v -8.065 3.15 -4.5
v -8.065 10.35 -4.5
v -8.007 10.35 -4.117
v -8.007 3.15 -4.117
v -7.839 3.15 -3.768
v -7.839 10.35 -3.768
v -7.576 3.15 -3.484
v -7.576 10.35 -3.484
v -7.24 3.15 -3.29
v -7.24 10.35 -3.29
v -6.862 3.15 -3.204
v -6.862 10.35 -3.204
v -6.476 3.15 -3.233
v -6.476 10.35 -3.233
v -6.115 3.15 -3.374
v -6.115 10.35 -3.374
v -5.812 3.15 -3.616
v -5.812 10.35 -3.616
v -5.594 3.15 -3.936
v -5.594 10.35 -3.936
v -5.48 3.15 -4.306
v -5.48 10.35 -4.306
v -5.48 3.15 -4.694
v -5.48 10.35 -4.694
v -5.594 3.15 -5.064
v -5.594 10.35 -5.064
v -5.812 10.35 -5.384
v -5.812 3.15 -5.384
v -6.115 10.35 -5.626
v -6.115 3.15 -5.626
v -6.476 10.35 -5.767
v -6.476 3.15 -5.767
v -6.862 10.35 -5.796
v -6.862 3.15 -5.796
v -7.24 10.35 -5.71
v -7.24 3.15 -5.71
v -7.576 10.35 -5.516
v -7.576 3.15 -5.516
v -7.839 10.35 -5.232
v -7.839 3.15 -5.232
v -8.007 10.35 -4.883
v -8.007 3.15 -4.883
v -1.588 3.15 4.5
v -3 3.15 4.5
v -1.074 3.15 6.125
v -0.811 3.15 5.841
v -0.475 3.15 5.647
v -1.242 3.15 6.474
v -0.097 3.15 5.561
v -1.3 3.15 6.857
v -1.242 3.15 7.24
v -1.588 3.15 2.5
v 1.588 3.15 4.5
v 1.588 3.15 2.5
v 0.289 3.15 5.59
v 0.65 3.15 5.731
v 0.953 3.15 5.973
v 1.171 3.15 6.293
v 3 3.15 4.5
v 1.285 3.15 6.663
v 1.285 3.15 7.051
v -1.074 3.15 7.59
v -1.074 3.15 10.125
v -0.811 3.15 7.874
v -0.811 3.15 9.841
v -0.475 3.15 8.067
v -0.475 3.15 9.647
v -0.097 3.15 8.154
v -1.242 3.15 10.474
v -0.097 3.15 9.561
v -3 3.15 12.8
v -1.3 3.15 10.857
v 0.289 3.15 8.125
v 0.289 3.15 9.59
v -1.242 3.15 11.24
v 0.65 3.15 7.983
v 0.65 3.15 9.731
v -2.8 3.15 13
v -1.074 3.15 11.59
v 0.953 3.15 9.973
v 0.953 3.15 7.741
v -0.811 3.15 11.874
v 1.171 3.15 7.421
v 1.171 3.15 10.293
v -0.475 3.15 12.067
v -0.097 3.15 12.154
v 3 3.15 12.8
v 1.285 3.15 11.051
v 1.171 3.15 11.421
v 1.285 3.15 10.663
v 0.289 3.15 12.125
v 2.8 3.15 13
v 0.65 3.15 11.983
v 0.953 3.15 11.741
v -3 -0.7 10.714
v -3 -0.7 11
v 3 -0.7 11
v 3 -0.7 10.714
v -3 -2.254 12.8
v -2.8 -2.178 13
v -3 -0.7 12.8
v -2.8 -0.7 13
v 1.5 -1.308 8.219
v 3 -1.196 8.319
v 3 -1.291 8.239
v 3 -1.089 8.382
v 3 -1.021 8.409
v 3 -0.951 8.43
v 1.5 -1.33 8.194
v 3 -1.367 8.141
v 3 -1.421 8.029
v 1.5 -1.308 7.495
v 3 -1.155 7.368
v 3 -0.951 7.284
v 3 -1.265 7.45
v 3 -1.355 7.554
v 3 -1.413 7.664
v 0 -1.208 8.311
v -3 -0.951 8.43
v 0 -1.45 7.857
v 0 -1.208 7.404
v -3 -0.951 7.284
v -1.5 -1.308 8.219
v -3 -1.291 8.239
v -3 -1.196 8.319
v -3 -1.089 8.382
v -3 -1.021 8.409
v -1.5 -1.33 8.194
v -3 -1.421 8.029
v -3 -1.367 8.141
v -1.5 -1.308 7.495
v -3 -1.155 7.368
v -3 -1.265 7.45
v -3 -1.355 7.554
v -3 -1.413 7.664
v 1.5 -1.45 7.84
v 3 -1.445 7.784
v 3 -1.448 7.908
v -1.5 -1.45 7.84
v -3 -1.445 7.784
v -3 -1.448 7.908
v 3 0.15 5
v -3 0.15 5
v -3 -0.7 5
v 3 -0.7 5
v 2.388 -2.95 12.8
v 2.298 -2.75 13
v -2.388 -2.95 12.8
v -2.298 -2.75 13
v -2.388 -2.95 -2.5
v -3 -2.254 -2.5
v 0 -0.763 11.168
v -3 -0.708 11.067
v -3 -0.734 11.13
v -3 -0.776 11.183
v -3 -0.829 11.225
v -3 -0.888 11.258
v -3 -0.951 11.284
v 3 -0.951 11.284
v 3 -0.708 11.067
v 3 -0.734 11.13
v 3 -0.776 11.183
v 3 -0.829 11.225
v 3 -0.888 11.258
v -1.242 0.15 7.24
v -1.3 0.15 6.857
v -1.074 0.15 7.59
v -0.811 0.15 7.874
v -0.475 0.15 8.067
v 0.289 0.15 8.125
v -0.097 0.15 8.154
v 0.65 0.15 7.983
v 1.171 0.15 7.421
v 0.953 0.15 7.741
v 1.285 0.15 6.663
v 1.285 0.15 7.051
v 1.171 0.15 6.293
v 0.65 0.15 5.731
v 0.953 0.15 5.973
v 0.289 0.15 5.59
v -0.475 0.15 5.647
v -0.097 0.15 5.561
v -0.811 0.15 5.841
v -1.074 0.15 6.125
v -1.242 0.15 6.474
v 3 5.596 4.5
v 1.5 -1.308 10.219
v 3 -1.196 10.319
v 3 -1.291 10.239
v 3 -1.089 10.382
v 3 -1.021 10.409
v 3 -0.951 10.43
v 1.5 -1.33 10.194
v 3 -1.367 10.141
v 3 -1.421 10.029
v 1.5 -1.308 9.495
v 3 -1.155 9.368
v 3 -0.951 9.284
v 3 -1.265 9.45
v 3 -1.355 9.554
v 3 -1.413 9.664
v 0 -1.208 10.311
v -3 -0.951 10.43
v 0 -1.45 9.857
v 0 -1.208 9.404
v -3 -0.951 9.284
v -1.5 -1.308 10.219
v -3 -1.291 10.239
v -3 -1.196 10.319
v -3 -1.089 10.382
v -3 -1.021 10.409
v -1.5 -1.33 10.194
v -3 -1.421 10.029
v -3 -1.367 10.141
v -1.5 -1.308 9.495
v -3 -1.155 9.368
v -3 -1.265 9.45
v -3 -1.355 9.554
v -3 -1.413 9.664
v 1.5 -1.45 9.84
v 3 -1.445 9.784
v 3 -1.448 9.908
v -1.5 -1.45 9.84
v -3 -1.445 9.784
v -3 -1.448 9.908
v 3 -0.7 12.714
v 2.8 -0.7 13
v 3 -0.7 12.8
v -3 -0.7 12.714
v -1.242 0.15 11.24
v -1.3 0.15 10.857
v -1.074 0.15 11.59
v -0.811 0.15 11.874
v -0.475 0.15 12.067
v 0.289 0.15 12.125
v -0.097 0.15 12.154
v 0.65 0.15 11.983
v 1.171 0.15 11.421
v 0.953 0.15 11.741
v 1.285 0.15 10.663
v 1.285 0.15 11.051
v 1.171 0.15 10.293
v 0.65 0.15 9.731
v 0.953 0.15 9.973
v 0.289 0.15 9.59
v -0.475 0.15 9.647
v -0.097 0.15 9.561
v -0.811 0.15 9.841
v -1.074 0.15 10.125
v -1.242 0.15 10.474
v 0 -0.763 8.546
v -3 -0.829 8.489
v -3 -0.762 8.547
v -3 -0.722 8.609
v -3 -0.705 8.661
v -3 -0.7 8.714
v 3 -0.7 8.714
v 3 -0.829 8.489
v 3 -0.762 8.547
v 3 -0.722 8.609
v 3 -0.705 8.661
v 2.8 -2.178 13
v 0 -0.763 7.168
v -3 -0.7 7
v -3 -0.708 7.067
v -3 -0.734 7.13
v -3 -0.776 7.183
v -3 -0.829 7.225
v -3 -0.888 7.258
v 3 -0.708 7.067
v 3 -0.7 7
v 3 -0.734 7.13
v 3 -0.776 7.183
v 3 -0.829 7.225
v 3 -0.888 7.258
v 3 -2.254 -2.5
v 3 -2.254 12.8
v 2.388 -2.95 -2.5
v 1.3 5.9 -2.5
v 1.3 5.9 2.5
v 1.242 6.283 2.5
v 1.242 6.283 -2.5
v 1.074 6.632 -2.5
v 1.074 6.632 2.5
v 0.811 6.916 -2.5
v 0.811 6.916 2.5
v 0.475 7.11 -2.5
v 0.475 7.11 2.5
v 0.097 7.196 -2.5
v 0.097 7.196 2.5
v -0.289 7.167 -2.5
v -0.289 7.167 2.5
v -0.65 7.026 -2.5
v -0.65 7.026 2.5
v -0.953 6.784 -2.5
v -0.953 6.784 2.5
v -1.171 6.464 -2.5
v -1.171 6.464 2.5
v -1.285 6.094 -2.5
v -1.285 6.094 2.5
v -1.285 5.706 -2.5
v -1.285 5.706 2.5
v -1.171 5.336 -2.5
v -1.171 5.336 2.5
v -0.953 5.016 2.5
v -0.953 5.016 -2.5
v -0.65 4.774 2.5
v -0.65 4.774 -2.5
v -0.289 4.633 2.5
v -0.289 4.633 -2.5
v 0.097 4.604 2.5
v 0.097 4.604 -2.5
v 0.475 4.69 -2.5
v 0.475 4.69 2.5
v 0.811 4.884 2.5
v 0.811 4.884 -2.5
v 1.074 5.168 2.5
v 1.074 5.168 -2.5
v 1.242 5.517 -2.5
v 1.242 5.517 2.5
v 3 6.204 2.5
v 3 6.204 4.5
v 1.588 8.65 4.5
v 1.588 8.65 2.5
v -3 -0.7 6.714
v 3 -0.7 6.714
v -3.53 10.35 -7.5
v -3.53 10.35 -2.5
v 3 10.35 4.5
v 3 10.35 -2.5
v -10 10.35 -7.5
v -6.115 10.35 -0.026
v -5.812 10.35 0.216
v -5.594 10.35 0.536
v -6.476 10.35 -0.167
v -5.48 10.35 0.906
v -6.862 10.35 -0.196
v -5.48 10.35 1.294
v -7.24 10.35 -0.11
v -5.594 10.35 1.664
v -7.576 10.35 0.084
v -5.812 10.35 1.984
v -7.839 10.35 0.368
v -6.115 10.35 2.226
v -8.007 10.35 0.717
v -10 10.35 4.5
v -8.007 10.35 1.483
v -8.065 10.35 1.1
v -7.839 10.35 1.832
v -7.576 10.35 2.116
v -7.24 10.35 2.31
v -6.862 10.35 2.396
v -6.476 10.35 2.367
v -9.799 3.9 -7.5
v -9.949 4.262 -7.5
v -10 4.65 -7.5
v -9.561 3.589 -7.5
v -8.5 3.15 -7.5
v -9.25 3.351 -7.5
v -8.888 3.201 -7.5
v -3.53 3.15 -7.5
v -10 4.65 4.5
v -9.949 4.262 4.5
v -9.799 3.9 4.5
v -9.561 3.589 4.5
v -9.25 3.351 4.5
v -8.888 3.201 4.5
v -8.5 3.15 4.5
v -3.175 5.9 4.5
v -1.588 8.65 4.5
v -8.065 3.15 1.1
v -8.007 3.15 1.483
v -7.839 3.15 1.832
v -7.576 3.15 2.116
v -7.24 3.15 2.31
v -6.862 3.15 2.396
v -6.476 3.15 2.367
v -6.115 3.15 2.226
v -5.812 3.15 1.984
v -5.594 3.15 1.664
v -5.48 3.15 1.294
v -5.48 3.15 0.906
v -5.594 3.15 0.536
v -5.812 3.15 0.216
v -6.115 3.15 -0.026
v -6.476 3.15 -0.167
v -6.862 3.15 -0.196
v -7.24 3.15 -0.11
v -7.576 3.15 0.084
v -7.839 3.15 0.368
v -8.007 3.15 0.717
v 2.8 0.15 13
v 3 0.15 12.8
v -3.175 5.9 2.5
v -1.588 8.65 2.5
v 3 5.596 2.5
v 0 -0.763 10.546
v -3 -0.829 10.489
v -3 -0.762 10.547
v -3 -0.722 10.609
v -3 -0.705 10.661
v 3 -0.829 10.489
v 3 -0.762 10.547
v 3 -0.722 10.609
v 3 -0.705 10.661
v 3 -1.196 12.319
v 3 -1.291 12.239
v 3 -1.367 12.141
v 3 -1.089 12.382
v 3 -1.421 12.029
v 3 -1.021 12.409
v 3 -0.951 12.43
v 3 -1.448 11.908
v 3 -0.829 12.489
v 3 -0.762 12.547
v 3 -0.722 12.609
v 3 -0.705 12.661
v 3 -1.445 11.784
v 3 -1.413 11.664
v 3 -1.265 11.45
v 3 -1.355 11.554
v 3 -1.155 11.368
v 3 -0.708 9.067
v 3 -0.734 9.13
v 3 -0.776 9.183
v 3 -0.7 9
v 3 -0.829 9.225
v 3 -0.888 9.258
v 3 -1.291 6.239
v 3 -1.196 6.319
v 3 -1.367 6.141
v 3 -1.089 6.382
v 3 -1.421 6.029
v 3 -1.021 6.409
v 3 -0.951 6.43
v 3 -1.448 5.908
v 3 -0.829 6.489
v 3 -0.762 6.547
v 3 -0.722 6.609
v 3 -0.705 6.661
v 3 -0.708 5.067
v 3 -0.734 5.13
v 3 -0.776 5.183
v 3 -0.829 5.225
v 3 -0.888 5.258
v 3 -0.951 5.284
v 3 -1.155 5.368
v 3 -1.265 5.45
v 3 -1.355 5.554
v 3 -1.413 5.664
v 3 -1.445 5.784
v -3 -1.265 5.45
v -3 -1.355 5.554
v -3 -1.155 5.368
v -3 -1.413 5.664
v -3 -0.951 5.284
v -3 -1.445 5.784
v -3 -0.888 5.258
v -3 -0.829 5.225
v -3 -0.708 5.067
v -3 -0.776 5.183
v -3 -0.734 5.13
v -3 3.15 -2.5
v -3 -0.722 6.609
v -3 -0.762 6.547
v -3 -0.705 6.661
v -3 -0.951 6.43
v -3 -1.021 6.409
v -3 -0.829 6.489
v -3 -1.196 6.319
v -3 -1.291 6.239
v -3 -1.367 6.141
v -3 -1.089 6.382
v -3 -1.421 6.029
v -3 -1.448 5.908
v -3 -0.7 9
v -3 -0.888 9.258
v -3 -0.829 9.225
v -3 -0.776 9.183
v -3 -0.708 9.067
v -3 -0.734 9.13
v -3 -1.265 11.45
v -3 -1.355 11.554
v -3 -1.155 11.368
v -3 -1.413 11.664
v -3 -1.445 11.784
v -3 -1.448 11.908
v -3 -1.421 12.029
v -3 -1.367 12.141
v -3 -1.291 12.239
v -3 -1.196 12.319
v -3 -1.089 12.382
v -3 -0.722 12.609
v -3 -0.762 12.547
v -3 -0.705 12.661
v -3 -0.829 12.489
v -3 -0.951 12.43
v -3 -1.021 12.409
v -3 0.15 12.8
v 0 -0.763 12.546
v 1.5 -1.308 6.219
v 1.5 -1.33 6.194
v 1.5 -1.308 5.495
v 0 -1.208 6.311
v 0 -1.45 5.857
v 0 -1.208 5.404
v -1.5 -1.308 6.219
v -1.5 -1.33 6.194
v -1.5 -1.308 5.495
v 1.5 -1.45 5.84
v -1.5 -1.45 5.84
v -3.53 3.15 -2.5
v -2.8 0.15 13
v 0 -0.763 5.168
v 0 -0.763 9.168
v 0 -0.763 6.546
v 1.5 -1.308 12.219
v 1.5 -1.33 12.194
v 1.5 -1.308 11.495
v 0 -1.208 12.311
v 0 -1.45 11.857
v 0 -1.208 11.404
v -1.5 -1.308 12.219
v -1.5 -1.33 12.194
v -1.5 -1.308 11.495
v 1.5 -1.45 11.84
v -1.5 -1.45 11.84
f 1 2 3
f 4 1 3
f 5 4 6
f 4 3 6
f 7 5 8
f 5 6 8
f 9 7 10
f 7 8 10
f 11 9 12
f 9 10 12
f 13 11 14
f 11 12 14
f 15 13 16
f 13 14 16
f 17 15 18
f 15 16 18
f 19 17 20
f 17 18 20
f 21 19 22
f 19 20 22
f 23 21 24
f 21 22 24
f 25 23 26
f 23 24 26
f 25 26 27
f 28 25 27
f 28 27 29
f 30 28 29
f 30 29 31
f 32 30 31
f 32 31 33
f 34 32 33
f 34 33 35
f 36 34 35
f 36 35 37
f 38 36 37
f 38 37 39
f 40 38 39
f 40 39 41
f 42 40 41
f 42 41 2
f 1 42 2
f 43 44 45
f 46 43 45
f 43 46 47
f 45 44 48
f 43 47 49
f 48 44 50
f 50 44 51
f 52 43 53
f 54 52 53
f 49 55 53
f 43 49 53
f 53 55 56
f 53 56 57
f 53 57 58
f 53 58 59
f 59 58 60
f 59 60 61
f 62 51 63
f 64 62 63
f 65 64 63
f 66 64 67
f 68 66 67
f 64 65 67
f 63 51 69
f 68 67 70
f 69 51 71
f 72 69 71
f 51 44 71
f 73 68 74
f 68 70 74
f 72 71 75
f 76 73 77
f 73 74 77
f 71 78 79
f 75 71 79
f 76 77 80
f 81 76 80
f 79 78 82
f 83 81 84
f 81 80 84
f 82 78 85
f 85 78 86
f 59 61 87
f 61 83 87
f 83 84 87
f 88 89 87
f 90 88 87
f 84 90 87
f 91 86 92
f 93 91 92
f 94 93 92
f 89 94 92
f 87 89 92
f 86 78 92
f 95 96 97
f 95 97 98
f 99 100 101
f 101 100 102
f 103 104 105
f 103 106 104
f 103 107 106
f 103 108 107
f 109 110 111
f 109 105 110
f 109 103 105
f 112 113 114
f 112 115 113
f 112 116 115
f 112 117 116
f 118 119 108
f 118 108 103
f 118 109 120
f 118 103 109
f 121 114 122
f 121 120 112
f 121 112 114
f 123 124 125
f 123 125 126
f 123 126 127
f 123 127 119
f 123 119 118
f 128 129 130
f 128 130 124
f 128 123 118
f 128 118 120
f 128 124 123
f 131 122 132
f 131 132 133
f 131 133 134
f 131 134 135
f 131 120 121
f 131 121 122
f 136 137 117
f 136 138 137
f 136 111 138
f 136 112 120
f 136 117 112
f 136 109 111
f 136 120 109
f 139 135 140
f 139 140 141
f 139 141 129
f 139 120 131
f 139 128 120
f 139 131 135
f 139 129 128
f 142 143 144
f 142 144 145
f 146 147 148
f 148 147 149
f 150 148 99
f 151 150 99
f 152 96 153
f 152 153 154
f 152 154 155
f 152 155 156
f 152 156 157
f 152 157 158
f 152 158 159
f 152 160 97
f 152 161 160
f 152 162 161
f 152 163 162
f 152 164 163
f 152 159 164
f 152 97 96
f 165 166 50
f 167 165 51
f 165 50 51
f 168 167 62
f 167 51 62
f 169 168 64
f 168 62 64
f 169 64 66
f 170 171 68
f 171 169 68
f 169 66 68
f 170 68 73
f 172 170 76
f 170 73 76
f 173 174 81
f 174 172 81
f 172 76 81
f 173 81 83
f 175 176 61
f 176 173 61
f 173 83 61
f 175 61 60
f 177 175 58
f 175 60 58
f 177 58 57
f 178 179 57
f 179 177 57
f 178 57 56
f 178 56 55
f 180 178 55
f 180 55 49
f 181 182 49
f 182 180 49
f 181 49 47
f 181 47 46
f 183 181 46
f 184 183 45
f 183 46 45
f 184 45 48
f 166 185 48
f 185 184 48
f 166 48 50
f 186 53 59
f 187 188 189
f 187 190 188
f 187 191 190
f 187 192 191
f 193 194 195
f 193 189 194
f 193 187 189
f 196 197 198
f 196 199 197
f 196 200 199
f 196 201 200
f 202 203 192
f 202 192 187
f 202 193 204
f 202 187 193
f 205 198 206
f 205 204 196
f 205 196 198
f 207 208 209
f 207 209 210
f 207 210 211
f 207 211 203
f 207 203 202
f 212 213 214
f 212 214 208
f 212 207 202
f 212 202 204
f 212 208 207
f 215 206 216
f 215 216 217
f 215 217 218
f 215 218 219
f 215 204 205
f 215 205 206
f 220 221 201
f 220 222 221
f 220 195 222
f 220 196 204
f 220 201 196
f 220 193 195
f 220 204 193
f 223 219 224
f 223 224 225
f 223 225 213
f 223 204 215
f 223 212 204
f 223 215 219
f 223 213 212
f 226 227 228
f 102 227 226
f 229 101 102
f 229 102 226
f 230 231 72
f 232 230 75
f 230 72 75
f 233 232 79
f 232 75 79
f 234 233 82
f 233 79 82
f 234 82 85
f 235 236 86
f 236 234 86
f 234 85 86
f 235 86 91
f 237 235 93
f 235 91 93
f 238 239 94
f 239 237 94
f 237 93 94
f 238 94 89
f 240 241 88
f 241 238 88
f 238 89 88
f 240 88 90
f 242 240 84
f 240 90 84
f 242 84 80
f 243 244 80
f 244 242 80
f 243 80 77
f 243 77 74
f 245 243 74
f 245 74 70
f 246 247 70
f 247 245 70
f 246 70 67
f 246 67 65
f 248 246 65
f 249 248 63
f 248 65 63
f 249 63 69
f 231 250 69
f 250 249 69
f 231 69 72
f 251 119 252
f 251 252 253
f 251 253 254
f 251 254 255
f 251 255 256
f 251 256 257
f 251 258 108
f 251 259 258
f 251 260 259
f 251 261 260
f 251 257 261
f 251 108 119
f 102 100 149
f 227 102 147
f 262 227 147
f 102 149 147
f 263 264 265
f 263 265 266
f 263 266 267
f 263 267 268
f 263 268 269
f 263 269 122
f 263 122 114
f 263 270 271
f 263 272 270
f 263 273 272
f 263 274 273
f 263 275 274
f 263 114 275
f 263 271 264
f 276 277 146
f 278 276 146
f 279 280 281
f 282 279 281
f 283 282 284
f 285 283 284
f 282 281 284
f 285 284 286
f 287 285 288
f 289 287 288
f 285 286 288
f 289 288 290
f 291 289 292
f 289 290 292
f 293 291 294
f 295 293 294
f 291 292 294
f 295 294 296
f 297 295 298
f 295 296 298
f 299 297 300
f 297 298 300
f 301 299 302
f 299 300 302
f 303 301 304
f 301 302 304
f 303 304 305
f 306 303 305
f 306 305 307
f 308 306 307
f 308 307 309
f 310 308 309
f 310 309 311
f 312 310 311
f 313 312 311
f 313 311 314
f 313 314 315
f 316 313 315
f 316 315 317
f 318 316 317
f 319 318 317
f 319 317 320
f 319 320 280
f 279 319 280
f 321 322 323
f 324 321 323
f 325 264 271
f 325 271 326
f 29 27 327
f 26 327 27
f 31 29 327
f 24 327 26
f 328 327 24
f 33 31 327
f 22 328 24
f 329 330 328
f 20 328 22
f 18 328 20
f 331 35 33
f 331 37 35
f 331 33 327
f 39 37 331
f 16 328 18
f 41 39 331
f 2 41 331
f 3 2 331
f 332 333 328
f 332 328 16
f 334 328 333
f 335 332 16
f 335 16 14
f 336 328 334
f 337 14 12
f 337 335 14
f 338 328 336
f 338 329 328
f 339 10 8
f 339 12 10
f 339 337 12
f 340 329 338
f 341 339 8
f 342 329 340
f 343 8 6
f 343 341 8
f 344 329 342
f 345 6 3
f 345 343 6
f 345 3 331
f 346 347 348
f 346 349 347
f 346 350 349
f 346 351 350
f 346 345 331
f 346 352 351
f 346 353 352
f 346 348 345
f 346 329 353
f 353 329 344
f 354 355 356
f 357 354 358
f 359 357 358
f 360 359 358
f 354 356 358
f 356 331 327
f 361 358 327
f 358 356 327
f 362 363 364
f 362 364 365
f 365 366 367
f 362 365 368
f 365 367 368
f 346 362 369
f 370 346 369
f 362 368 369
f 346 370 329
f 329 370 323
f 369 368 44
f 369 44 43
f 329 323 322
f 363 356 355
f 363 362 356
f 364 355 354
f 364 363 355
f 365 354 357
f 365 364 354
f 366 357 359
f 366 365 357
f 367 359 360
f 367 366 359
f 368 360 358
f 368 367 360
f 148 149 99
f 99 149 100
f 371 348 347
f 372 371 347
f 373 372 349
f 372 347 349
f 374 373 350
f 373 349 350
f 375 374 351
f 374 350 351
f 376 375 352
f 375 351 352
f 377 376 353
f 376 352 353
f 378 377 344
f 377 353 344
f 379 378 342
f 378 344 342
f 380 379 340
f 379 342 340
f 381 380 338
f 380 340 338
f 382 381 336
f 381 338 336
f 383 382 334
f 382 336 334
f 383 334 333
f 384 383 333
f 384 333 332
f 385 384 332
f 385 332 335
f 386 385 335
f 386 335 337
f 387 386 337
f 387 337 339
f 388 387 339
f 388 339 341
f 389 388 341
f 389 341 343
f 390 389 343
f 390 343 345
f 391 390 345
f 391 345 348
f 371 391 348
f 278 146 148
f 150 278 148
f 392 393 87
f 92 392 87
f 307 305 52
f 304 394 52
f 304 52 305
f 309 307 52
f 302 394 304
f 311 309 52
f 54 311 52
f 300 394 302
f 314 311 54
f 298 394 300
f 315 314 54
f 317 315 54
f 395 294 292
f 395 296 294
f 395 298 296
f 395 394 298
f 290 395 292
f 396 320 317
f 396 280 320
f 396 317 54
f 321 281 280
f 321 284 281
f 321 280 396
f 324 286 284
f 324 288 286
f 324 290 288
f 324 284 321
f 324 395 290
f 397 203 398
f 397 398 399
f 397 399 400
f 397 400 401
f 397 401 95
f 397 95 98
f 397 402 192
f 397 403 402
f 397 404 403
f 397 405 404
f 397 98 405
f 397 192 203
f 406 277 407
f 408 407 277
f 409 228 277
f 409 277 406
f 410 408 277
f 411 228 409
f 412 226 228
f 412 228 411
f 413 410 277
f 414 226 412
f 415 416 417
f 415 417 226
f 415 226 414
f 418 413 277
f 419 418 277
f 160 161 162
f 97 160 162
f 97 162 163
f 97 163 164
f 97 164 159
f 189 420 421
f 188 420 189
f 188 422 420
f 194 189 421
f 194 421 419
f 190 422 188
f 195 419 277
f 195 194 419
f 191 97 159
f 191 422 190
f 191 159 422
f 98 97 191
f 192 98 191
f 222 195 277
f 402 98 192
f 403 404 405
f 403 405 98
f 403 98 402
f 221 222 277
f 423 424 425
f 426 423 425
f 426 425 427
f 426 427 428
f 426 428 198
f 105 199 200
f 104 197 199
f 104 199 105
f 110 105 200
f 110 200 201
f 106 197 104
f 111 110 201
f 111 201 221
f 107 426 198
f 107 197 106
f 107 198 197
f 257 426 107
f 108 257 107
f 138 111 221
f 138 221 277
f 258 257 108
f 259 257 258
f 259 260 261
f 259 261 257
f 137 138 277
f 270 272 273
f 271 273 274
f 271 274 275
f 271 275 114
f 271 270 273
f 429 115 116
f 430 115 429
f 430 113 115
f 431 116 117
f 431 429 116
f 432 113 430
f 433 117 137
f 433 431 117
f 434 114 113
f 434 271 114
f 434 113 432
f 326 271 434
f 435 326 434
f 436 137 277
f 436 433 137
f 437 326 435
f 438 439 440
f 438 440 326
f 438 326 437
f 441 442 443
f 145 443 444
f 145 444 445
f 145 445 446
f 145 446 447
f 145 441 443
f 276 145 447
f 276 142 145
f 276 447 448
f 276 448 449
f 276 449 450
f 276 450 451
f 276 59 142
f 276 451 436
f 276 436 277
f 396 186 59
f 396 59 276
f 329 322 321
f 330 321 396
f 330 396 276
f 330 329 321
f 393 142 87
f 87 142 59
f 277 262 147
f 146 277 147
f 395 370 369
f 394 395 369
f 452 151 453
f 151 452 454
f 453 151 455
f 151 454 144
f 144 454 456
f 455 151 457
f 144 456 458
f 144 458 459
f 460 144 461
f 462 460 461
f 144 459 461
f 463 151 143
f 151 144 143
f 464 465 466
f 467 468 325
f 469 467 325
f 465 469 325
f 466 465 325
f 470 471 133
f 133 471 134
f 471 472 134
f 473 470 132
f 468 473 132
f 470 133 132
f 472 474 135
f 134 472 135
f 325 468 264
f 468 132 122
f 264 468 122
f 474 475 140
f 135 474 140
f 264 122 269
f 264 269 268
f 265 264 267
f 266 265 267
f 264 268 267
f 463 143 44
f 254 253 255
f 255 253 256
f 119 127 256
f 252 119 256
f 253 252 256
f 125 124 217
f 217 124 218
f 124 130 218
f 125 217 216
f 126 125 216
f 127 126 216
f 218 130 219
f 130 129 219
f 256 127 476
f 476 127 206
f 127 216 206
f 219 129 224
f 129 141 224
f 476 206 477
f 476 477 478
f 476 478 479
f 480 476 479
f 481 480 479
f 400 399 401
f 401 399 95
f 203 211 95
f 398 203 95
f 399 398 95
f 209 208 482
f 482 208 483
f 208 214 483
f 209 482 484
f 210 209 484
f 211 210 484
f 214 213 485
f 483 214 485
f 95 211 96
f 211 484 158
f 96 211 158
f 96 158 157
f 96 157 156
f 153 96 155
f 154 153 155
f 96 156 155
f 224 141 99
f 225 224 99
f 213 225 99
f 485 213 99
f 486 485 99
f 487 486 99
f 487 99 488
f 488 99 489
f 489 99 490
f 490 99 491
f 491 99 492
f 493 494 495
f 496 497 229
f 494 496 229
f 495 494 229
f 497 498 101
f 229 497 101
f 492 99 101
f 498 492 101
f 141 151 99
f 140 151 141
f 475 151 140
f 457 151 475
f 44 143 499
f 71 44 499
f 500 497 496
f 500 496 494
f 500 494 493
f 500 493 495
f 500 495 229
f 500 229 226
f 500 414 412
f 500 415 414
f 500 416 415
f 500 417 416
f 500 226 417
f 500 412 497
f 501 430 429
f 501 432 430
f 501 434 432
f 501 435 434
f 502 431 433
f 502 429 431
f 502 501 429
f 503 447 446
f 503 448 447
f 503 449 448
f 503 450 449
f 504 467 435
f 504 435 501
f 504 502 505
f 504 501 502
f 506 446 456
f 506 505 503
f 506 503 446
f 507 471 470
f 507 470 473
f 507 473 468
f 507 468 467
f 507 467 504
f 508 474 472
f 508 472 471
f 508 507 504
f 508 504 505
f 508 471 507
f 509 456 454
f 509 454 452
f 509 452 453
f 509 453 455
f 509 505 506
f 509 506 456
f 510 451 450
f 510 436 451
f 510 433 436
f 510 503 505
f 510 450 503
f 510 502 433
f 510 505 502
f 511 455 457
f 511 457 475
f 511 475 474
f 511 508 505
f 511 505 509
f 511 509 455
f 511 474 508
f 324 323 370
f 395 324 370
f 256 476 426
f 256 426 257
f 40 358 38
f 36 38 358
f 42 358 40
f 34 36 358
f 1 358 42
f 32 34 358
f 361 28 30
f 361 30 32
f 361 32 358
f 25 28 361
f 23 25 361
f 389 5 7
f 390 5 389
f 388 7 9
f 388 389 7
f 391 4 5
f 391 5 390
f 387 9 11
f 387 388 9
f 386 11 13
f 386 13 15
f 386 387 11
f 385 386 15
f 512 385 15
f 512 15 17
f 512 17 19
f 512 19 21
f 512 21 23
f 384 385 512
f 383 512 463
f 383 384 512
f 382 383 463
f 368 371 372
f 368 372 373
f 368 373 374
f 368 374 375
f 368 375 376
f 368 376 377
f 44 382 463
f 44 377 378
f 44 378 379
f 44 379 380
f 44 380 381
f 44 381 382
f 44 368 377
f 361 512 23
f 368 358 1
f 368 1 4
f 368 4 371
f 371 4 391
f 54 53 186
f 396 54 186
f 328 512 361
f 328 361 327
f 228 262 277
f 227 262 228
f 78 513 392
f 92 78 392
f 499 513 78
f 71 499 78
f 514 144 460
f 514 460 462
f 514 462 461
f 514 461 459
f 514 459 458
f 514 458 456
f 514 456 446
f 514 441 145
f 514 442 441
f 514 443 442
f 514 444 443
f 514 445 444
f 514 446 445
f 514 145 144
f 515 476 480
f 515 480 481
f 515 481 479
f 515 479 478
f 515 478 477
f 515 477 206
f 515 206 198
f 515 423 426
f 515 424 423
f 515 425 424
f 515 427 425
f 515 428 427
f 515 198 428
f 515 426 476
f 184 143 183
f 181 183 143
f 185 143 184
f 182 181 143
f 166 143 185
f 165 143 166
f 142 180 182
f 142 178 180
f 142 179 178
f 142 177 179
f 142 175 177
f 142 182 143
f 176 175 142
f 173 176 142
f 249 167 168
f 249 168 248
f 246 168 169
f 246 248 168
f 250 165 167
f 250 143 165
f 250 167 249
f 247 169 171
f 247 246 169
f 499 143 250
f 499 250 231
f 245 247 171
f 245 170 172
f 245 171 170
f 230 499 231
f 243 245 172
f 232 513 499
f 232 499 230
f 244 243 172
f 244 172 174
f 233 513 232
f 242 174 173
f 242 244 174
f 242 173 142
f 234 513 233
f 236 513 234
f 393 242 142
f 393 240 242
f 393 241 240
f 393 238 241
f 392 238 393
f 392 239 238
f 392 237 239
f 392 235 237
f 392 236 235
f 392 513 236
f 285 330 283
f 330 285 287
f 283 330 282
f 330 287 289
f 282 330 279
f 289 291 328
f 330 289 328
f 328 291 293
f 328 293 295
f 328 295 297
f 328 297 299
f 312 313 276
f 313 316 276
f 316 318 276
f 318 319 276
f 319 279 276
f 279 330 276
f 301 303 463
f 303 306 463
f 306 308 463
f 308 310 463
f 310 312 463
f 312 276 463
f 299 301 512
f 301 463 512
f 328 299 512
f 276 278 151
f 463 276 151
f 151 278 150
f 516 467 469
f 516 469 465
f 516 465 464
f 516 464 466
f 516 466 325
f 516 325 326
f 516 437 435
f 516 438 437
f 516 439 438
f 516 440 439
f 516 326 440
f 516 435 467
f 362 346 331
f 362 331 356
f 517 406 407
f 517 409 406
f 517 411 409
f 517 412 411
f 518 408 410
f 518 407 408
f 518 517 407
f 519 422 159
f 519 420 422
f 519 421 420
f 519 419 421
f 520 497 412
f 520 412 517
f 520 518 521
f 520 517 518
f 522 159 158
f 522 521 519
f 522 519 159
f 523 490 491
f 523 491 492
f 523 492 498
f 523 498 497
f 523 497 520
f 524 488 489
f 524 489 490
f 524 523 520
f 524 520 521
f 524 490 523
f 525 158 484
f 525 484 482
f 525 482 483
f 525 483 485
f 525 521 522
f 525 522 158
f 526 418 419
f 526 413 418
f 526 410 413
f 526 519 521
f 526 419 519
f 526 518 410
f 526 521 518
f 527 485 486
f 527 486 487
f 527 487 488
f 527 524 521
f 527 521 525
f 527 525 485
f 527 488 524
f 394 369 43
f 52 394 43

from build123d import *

# Parameters (mm, degrees)
BOSS_EXTRUDE1_DEPTH     = 13
SKETCH6_W               = 6
SKETCH6_H               = 5
BOSS_EXTRUDE4_DEPTH     = 5.6
SKETCH16_W              = 6
SKETCH16_H              = 8
BOSS_EXTRUDE5_DEPTH     = 0.1
CUT_EXTRUDE6_DEPTH      = 4
CUT_EXTRUDE6_DEPTH_BACK = 3.6
SKETCH15_R              = 1.3
CUT_EXTRUDE7_DEPTH      = 8.7202
CUT_EXTRUDE8_START      = -0.2202
SKETCH19_W              = 6
SKETCH19_H              = 8
SKETCH19_R              = 1.3
CUT_EXTRUDE8_DEPTH      = 0.2202
SKETCH12_R              = 1.2
CUT_EXTRUDE5_DEPTH      = 6
SKETCH21_R              = 1.2
BOSS_EXTRUDE6_DEPTH     = 2.5
SKETCH24_W              = 6
SKETCH24_H              = 5.5
CUT_EXTRUDE10_DEPTH     = 8.5
BOSS_EXTRUDE8_DEPTH     = 7.2
FILLET4_R               = 1.5
SKETCH26_R              = 1.3
CUT_EXTRUDE11_DEPTH     = 10
CHAMFER1_SIZE           = 0.2
BOSS_EXTRUDE9_DEPTH     = 5
SKETCH31_R              = 1.3
CUT_EXTRUDE12_DEPTH     = 8
CROQUIS1_W              = 20.968017067
CROQUIS1_H              = 19.092350392
CORTAR_EXTRUIR1_DEPTH   = 0.5
CORTAR_EXTRUIR2_DEPTH   = 2


with BuildPart() as part:
    # Sketch1 → Boss-Extrude1 (new body)
    with BuildSketch(Plane.XY):
        Polygon((3, 3.05), (3, -2.253801214), (2.388188946, -2.95), (-2.388188946, -2.95), (-3, -2.253801214), (-3, 3.05), align=None)
    extrude(amount=BOSS_EXTRUDE1_DEPTH)

    # Sketch6 → Boss-Extrude4 (add)
    with BuildSketch(Plane(origin=(0, 3.05, 0), x_dir=(1, 0, 0), z_dir=(0, 1, 0))):
        with Locations((0, -2.5)):
            Rectangle(SKETCH6_W, SKETCH6_H)
    extrude(amount=BOSS_EXTRUDE4_DEPTH)

    # Sketch16 → Boss-Extrude5 (add)
    with BuildSketch(Plane(origin=(0, 3.05, 0), x_dir=(1, 0, 0), z_dir=(0, 1, 0))):
        with Locations((0, -9)):
            Rectangle(SKETCH16_W, SKETCH16_H)
    extrude(amount=BOSS_EXTRUDE5_DEPTH)

    # Sketch18 → Cut-Extrude6 (cut, two sides: drawn at the far end of the back side and taken through both)
    with BuildSketch(Plane(origin=(0, 0, 0), x_dir=(0, 0, -1), z_dir=(1, 0, 0)).offset(-CUT_EXTRUDE6_DEPTH_BACK)):
        with BuildLine():
            Line((-8.8572, -0.0702), (-12.8572, -0.0702))
            Line((-12.8572, -0.0702), (-13, -0.0702))
            Line((-13, -0.0702), (-13, -0.7))
            Line((-13, -0.7), (-12.8572, -0.7))
            Line((-12.8572, -0.7), (-12.7144, -0.7))
            add(Edge.make_bspline(
                [(-12.7144, -0.7), (-12.5198, -0.7), (-12.43, -0.9509)],
                knots=[0.103448276, 0.103448276, 0.103448276, 0.137931034, 0.137931034, 0.137931034], degree=2))
            add(Edge.make_bspline(
                [(-12.43, -0.9509), (-12.3594, -1.2388), (-12.13, -1.45), (-11.8572, -1.45)],
                knots=[0.137931034, 0.137931034, 0.137931034, 0.137931034, 0.172413793, 0.172413793, 0.172413793, 0.172413793], degree=3))
            add(Edge.make_bspline(
                [(-11.8572, -1.45), (-11.5844, -1.45), (-11.355, -1.2388), (-11.2844, -0.9509)],
                knots=[0.172413793, 0.172413793, 0.172413793, 0.172413793, 0.206896552, 0.206896552, 0.206896552, 0.206896552], degree=3))
            add(Edge.make_bspline(
                [(-11.2844, -0.9509), (-11.1946, -0.7), (-11, -0.7)],
                knots=[0.206896552, 0.206896552, 0.206896552, 0.24137931, 0.24137931, 0.24137931], degree=2))
            Line((-11, -0.7), (-10.8572, -0.7))
            Line((-10.8572, -0.7), (-10.7144, -0.7))
            add(Edge.make_bspline(
                [(-10.7144, -0.7), (-10.5198, -0.7), (-10.43, -0.9509)],
                knots=[0.310344828, 0.310344828, 0.310344828, 0.344827586, 0.344827586, 0.344827586], degree=2))
            add(Edge.make_bspline(
                [(-10.43, -0.9509), (-10.3594, -1.2388), (-10.13, -1.45), (-9.8572, -1.45)],
                knots=[0.344827586, 0.344827586, 0.344827586, 0.344827586, 0.379310345, 0.379310345, 0.379310345, 0.379310345], degree=3))
            add(Edge.make_bspline(
                [(-9.8572, -1.45), (-9.5844, -1.45), (-9.355, -1.2388), (-9.2844, -0.9509)],
                knots=[0.379310345, 0.379310345, 0.379310345, 0.379310345, 0.413793103, 0.413793103, 0.413793103, 0.413793103], degree=3))
            add(Edge.make_bspline(
                [(-9.2844, -0.9509), (-9.1946, -0.7), (-9, -0.7)],
                knots=[0.413793103, 0.413793103, 0.413793103, 0.448275862, 0.448275862, 0.448275862], degree=2))
            Line((-9, -0.7), (-8.8572, -0.7))
            Line((-8.8572, -0.7), (-8.7144, -0.7))
            add(Edge.make_bspline(
                [(-8.7144, -0.7), (-8.5198, -0.7), (-8.43, -0.9509)],
                knots=[0.517241379, 0.517241379, 0.517241379, 0.551724138, 0.551724138, 0.551724138], degree=2))
            add(Edge.make_bspline(
                [(-8.43, -0.9509), (-8.3594, -1.2388), (-8.13, -1.45), (-7.8572, -1.45)],
                knots=[0.551724138, 0.551724138, 0.551724138, 0.551724138, 0.586206897, 0.586206897, 0.586206897, 0.586206897], degree=3))
            add(Edge.make_bspline(
                [(-7.8572, -1.45), (-7.5844, -1.45), (-7.355, -1.2388), (-7.2844, -0.9509)],
                knots=[0.586206897, 0.586206897, 0.586206897, 0.586206897, 0.620689655, 0.620689655, 0.620689655, 0.620689655], degree=3))
            add(Edge.make_bspline(
                [(-7.2844, -0.9509), (-7.1946, -0.7), (-7, -0.7)],
                knots=[0.620689655, 0.620689655, 0.620689655, 0.655172414, 0.655172414, 0.655172414], degree=2))
            Line((-7, -0.7), (-6.8572, -0.7))
            Line((-6.8572, -0.7), (-6.7144, -0.7))
            add(Edge.make_bspline(
                [(-6.7144, -0.7), (-6.5198, -0.7), (-6.43, -0.9509)],
                knots=[0.724137931, 0.724137931, 0.724137931, 0.75862069, 0.75862069, 0.75862069], degree=2))
            add(Edge.make_bspline(
                [(-6.43, -0.9509), (-6.3594, -1.2388), (-6.13, -1.45), (-5.8572, -1.45)],
                knots=[0.75862069, 0.75862069, 0.75862069, 0.75862069, 0.793103448, 0.793103448, 0.793103448, 0.793103448], degree=3))
            add(Edge.make_bspline(
                [(-5.8572, -1.45), (-5.5844, -1.45), (-5.355, -1.2388), (-5.2844, -0.9509)],
                knots=[0.793103448, 0.793103448, 0.793103448, 0.793103448, 0.827586207, 0.827586207, 0.827586207, 0.827586207], degree=3))
            add(Edge.make_bspline(
                [(-5.2844, -0.9509), (-5.1946, -0.7), (-5, -0.7)],
                knots=[0.827586207, 0.827586207, 0.827586207, 0.862068966, 0.862068966, 0.862068966], degree=2))
            Line((-5, -0.7), (-5, -0.0702))
            Line((-5, -0.0702), (-8.8572, -0.0702))
        make_face()
    extrude(amount=CUT_EXTRUDE6_DEPTH + CUT_EXTRUDE6_DEPTH_BACK, mode=Mode.SUBTRACT)

    # Sketch15 → Cut-Extrude7 (cut)
    with BuildSketch(Plane(origin=(0, 8.65, 0), x_dir=(1, 0, 0), z_dir=(0, 1, 0))):
        with Locations(Location((0, -10.8572, 0), (0, 0, 180))):
            Circle(SKETCH15_R)
        with Locations(Location((0, -6.8572, 0), (0, 0, 180))):
            Circle(SKETCH15_R)
    extrude(amount=-CUT_EXTRUDE7_DEPTH, mode=Mode.SUBTRACT)

    # Sketch19 → Cut-Extrude8 (cut)
    with BuildSketch(Plane.XZ.offset(0.0702).offset(CUT_EXTRUDE8_START)):
        with Locations((0, 9)):
            Rectangle(SKETCH19_W, SKETCH19_H)
        with Locations(Location((0, 10.8572, 0), (0, 0, 180))):
            Circle(SKETCH19_R, mode=Mode.SUBTRACT)
        with Locations(Location((0, 6.8572, 0), (0, 0, 180))):
            Circle(SKETCH19_R, mode=Mode.SUBTRACT)
    extrude(amount=CUT_EXTRUDE8_DEPTH, mode=Mode.SUBTRACT)

    # Sketch12 → Cut-Extrude5 (cut)
    with BuildSketch(Plane.XY.offset(5)):
        with Locations((0, 5.85)):
            Circle(SKETCH12_R)
    extrude(amount=-CUT_EXTRUDE5_DEPTH, mode=Mode.SUBTRACT)

    # Sketch21 → Boss-Extrude6 (add)
    with BuildSketch(Plane(origin=(0, 0, 0), x_dir=(-1, 0, 0), z_dir=(0, 0, -1))):
        Polygon((-2.388188946, -2.95), (2.388188946, -2.95), (3, -2.253801214), (3, 8.65), (-3, 8.65), (-3, -2.253801214), align=None)
        with Locations(Location((0, 5.85, 0), (0, 0, 180))):
            Circle(SKETCH21_R, mode=Mode.SUBTRACT)
    extrude(amount=BOSS_EXTRUDE6_DEPTH)

    # Sketch24 → Cut-Extrude10 (cut)
    with BuildSketch(Plane.XY.offset(5)):
        with Locations((0, 5.9)):
            Rectangle(SKETCH24_W, SKETCH24_H)
    extrude(amount=-CUT_EXTRUDE10_DEPTH, mode=Mode.SUBTRACT)

    # Sketch25 → Boss-Extrude8 (add)
    with BuildSketch(Plane(origin=(0, 3.15, 0), x_dir=(1, 0, 0), z_dir=(0, 1, 0))):
        Polygon((-10, -4.5), (0, -4.5), (3.5, -4.5), (3.5, 2.5), (-10, 2.5), align=None)
    extrude(amount=BOSS_EXTRUDE8_DEPTH)

    # Fillet4
    fillet4_edges = [part.edges().sort_by_distance(p)[0] for p in [
        (-10, 3.15, 1),
    ]]
    fillet(fillet4_edges, radius=FILLET4_R)

    # Sketch26 → Cut-Extrude11 (cut)
    with BuildSketch(Plane.XY.offset(4.5)):
        with Locations((0, 5.9)):
            Circle(SKETCH26_R)
    extrude(amount=-CUT_EXTRUDE11_DEPTH, mode=Mode.SUBTRACT)

    # Chamfer1
    chamfer1_edges = [part.edges().sort_by_distance(p)[0] for p in [
        (-2.694094473, -2.601900607, 13),
        (0, -2.95, 13),
        (2.694094473, -2.601900607, 13),
        (3, 1.65, 13),
        (3, -1.476900607, 13),
        (-3, -1.476900607, 13),
        (-3, 1.65, 13),
    ]]
    chamfer(chamfer1_edges, length=CHAMFER1_SIZE)

    # Sketch29 → Boss-Extrude9 (add)
    with BuildSketch(Plane(origin=(0, 0, -2.5), x_dir=(-1, 0, 0), z_dir=(0, 0, -1))):
        with BuildLine():
            Line((3.53, 3.15), (3.53, 10.35))
            Line((3.53, 10.35), (10, 10.35))
            Line((10, 10.35), (10, 4.65))
            ThreePointArc((10, 4.65), (9.560660172, 3.589339828), (8.5, 3.15))
            Line((8.5, 3.15), (3.53, 3.15))
        make_face()
    extrude(amount=BOSS_EXTRUDE9_DEPTH)

    # Sketch31 → Cut-Extrude12 (cut)
    with BuildSketch(Plane(origin=(0, 10.35, 0), x_dir=(1, 0, 0), z_dir=(0, 1, 0))):
        with Locations(Location((-6.765, 4.5, 0), (0, 0, 180))):
            Circle(SKETCH31_R)
        with Locations(Location((-6.765, -1.1, 0), (0, 0, 180))):
            Circle(SKETCH31_R)
    extrude(amount=-CUT_EXTRUDE12_DEPTH, mode=Mode.SUBTRACT)

    # Croquis1 → Cortar-Extruir1 (cut)
    with BuildSketch(Plane(origin=(3.5, 0, 0), x_dir=(0, 0, -1), z_dir=(1, 0, 0))):
        with Locations((-1.115538408, 6.705636454)):
            Rectangle(CROQUIS1_W, CROQUIS1_H)
    extrude(amount=-CORTAR_EXTRUIR1_DEPTH, mode=Mode.SUBTRACT)

    # Croquis2 → Cortar-Extruir2 (cut)
    with BuildSketch(Plane.XY.offset(4.5)):
        Polygon((1.58771324, 8.65), (-1.58771324, 8.65), (-3.175426481, 5.9), (-1.58771324, 3.15), (1.58771324, 3.15), (3.175426481, 5.9), align=None)
    extrude(amount=-CORTAR_EXTRUIR2_DEPTH, mode=Mode.SUBTRACT)


solid = part.part
